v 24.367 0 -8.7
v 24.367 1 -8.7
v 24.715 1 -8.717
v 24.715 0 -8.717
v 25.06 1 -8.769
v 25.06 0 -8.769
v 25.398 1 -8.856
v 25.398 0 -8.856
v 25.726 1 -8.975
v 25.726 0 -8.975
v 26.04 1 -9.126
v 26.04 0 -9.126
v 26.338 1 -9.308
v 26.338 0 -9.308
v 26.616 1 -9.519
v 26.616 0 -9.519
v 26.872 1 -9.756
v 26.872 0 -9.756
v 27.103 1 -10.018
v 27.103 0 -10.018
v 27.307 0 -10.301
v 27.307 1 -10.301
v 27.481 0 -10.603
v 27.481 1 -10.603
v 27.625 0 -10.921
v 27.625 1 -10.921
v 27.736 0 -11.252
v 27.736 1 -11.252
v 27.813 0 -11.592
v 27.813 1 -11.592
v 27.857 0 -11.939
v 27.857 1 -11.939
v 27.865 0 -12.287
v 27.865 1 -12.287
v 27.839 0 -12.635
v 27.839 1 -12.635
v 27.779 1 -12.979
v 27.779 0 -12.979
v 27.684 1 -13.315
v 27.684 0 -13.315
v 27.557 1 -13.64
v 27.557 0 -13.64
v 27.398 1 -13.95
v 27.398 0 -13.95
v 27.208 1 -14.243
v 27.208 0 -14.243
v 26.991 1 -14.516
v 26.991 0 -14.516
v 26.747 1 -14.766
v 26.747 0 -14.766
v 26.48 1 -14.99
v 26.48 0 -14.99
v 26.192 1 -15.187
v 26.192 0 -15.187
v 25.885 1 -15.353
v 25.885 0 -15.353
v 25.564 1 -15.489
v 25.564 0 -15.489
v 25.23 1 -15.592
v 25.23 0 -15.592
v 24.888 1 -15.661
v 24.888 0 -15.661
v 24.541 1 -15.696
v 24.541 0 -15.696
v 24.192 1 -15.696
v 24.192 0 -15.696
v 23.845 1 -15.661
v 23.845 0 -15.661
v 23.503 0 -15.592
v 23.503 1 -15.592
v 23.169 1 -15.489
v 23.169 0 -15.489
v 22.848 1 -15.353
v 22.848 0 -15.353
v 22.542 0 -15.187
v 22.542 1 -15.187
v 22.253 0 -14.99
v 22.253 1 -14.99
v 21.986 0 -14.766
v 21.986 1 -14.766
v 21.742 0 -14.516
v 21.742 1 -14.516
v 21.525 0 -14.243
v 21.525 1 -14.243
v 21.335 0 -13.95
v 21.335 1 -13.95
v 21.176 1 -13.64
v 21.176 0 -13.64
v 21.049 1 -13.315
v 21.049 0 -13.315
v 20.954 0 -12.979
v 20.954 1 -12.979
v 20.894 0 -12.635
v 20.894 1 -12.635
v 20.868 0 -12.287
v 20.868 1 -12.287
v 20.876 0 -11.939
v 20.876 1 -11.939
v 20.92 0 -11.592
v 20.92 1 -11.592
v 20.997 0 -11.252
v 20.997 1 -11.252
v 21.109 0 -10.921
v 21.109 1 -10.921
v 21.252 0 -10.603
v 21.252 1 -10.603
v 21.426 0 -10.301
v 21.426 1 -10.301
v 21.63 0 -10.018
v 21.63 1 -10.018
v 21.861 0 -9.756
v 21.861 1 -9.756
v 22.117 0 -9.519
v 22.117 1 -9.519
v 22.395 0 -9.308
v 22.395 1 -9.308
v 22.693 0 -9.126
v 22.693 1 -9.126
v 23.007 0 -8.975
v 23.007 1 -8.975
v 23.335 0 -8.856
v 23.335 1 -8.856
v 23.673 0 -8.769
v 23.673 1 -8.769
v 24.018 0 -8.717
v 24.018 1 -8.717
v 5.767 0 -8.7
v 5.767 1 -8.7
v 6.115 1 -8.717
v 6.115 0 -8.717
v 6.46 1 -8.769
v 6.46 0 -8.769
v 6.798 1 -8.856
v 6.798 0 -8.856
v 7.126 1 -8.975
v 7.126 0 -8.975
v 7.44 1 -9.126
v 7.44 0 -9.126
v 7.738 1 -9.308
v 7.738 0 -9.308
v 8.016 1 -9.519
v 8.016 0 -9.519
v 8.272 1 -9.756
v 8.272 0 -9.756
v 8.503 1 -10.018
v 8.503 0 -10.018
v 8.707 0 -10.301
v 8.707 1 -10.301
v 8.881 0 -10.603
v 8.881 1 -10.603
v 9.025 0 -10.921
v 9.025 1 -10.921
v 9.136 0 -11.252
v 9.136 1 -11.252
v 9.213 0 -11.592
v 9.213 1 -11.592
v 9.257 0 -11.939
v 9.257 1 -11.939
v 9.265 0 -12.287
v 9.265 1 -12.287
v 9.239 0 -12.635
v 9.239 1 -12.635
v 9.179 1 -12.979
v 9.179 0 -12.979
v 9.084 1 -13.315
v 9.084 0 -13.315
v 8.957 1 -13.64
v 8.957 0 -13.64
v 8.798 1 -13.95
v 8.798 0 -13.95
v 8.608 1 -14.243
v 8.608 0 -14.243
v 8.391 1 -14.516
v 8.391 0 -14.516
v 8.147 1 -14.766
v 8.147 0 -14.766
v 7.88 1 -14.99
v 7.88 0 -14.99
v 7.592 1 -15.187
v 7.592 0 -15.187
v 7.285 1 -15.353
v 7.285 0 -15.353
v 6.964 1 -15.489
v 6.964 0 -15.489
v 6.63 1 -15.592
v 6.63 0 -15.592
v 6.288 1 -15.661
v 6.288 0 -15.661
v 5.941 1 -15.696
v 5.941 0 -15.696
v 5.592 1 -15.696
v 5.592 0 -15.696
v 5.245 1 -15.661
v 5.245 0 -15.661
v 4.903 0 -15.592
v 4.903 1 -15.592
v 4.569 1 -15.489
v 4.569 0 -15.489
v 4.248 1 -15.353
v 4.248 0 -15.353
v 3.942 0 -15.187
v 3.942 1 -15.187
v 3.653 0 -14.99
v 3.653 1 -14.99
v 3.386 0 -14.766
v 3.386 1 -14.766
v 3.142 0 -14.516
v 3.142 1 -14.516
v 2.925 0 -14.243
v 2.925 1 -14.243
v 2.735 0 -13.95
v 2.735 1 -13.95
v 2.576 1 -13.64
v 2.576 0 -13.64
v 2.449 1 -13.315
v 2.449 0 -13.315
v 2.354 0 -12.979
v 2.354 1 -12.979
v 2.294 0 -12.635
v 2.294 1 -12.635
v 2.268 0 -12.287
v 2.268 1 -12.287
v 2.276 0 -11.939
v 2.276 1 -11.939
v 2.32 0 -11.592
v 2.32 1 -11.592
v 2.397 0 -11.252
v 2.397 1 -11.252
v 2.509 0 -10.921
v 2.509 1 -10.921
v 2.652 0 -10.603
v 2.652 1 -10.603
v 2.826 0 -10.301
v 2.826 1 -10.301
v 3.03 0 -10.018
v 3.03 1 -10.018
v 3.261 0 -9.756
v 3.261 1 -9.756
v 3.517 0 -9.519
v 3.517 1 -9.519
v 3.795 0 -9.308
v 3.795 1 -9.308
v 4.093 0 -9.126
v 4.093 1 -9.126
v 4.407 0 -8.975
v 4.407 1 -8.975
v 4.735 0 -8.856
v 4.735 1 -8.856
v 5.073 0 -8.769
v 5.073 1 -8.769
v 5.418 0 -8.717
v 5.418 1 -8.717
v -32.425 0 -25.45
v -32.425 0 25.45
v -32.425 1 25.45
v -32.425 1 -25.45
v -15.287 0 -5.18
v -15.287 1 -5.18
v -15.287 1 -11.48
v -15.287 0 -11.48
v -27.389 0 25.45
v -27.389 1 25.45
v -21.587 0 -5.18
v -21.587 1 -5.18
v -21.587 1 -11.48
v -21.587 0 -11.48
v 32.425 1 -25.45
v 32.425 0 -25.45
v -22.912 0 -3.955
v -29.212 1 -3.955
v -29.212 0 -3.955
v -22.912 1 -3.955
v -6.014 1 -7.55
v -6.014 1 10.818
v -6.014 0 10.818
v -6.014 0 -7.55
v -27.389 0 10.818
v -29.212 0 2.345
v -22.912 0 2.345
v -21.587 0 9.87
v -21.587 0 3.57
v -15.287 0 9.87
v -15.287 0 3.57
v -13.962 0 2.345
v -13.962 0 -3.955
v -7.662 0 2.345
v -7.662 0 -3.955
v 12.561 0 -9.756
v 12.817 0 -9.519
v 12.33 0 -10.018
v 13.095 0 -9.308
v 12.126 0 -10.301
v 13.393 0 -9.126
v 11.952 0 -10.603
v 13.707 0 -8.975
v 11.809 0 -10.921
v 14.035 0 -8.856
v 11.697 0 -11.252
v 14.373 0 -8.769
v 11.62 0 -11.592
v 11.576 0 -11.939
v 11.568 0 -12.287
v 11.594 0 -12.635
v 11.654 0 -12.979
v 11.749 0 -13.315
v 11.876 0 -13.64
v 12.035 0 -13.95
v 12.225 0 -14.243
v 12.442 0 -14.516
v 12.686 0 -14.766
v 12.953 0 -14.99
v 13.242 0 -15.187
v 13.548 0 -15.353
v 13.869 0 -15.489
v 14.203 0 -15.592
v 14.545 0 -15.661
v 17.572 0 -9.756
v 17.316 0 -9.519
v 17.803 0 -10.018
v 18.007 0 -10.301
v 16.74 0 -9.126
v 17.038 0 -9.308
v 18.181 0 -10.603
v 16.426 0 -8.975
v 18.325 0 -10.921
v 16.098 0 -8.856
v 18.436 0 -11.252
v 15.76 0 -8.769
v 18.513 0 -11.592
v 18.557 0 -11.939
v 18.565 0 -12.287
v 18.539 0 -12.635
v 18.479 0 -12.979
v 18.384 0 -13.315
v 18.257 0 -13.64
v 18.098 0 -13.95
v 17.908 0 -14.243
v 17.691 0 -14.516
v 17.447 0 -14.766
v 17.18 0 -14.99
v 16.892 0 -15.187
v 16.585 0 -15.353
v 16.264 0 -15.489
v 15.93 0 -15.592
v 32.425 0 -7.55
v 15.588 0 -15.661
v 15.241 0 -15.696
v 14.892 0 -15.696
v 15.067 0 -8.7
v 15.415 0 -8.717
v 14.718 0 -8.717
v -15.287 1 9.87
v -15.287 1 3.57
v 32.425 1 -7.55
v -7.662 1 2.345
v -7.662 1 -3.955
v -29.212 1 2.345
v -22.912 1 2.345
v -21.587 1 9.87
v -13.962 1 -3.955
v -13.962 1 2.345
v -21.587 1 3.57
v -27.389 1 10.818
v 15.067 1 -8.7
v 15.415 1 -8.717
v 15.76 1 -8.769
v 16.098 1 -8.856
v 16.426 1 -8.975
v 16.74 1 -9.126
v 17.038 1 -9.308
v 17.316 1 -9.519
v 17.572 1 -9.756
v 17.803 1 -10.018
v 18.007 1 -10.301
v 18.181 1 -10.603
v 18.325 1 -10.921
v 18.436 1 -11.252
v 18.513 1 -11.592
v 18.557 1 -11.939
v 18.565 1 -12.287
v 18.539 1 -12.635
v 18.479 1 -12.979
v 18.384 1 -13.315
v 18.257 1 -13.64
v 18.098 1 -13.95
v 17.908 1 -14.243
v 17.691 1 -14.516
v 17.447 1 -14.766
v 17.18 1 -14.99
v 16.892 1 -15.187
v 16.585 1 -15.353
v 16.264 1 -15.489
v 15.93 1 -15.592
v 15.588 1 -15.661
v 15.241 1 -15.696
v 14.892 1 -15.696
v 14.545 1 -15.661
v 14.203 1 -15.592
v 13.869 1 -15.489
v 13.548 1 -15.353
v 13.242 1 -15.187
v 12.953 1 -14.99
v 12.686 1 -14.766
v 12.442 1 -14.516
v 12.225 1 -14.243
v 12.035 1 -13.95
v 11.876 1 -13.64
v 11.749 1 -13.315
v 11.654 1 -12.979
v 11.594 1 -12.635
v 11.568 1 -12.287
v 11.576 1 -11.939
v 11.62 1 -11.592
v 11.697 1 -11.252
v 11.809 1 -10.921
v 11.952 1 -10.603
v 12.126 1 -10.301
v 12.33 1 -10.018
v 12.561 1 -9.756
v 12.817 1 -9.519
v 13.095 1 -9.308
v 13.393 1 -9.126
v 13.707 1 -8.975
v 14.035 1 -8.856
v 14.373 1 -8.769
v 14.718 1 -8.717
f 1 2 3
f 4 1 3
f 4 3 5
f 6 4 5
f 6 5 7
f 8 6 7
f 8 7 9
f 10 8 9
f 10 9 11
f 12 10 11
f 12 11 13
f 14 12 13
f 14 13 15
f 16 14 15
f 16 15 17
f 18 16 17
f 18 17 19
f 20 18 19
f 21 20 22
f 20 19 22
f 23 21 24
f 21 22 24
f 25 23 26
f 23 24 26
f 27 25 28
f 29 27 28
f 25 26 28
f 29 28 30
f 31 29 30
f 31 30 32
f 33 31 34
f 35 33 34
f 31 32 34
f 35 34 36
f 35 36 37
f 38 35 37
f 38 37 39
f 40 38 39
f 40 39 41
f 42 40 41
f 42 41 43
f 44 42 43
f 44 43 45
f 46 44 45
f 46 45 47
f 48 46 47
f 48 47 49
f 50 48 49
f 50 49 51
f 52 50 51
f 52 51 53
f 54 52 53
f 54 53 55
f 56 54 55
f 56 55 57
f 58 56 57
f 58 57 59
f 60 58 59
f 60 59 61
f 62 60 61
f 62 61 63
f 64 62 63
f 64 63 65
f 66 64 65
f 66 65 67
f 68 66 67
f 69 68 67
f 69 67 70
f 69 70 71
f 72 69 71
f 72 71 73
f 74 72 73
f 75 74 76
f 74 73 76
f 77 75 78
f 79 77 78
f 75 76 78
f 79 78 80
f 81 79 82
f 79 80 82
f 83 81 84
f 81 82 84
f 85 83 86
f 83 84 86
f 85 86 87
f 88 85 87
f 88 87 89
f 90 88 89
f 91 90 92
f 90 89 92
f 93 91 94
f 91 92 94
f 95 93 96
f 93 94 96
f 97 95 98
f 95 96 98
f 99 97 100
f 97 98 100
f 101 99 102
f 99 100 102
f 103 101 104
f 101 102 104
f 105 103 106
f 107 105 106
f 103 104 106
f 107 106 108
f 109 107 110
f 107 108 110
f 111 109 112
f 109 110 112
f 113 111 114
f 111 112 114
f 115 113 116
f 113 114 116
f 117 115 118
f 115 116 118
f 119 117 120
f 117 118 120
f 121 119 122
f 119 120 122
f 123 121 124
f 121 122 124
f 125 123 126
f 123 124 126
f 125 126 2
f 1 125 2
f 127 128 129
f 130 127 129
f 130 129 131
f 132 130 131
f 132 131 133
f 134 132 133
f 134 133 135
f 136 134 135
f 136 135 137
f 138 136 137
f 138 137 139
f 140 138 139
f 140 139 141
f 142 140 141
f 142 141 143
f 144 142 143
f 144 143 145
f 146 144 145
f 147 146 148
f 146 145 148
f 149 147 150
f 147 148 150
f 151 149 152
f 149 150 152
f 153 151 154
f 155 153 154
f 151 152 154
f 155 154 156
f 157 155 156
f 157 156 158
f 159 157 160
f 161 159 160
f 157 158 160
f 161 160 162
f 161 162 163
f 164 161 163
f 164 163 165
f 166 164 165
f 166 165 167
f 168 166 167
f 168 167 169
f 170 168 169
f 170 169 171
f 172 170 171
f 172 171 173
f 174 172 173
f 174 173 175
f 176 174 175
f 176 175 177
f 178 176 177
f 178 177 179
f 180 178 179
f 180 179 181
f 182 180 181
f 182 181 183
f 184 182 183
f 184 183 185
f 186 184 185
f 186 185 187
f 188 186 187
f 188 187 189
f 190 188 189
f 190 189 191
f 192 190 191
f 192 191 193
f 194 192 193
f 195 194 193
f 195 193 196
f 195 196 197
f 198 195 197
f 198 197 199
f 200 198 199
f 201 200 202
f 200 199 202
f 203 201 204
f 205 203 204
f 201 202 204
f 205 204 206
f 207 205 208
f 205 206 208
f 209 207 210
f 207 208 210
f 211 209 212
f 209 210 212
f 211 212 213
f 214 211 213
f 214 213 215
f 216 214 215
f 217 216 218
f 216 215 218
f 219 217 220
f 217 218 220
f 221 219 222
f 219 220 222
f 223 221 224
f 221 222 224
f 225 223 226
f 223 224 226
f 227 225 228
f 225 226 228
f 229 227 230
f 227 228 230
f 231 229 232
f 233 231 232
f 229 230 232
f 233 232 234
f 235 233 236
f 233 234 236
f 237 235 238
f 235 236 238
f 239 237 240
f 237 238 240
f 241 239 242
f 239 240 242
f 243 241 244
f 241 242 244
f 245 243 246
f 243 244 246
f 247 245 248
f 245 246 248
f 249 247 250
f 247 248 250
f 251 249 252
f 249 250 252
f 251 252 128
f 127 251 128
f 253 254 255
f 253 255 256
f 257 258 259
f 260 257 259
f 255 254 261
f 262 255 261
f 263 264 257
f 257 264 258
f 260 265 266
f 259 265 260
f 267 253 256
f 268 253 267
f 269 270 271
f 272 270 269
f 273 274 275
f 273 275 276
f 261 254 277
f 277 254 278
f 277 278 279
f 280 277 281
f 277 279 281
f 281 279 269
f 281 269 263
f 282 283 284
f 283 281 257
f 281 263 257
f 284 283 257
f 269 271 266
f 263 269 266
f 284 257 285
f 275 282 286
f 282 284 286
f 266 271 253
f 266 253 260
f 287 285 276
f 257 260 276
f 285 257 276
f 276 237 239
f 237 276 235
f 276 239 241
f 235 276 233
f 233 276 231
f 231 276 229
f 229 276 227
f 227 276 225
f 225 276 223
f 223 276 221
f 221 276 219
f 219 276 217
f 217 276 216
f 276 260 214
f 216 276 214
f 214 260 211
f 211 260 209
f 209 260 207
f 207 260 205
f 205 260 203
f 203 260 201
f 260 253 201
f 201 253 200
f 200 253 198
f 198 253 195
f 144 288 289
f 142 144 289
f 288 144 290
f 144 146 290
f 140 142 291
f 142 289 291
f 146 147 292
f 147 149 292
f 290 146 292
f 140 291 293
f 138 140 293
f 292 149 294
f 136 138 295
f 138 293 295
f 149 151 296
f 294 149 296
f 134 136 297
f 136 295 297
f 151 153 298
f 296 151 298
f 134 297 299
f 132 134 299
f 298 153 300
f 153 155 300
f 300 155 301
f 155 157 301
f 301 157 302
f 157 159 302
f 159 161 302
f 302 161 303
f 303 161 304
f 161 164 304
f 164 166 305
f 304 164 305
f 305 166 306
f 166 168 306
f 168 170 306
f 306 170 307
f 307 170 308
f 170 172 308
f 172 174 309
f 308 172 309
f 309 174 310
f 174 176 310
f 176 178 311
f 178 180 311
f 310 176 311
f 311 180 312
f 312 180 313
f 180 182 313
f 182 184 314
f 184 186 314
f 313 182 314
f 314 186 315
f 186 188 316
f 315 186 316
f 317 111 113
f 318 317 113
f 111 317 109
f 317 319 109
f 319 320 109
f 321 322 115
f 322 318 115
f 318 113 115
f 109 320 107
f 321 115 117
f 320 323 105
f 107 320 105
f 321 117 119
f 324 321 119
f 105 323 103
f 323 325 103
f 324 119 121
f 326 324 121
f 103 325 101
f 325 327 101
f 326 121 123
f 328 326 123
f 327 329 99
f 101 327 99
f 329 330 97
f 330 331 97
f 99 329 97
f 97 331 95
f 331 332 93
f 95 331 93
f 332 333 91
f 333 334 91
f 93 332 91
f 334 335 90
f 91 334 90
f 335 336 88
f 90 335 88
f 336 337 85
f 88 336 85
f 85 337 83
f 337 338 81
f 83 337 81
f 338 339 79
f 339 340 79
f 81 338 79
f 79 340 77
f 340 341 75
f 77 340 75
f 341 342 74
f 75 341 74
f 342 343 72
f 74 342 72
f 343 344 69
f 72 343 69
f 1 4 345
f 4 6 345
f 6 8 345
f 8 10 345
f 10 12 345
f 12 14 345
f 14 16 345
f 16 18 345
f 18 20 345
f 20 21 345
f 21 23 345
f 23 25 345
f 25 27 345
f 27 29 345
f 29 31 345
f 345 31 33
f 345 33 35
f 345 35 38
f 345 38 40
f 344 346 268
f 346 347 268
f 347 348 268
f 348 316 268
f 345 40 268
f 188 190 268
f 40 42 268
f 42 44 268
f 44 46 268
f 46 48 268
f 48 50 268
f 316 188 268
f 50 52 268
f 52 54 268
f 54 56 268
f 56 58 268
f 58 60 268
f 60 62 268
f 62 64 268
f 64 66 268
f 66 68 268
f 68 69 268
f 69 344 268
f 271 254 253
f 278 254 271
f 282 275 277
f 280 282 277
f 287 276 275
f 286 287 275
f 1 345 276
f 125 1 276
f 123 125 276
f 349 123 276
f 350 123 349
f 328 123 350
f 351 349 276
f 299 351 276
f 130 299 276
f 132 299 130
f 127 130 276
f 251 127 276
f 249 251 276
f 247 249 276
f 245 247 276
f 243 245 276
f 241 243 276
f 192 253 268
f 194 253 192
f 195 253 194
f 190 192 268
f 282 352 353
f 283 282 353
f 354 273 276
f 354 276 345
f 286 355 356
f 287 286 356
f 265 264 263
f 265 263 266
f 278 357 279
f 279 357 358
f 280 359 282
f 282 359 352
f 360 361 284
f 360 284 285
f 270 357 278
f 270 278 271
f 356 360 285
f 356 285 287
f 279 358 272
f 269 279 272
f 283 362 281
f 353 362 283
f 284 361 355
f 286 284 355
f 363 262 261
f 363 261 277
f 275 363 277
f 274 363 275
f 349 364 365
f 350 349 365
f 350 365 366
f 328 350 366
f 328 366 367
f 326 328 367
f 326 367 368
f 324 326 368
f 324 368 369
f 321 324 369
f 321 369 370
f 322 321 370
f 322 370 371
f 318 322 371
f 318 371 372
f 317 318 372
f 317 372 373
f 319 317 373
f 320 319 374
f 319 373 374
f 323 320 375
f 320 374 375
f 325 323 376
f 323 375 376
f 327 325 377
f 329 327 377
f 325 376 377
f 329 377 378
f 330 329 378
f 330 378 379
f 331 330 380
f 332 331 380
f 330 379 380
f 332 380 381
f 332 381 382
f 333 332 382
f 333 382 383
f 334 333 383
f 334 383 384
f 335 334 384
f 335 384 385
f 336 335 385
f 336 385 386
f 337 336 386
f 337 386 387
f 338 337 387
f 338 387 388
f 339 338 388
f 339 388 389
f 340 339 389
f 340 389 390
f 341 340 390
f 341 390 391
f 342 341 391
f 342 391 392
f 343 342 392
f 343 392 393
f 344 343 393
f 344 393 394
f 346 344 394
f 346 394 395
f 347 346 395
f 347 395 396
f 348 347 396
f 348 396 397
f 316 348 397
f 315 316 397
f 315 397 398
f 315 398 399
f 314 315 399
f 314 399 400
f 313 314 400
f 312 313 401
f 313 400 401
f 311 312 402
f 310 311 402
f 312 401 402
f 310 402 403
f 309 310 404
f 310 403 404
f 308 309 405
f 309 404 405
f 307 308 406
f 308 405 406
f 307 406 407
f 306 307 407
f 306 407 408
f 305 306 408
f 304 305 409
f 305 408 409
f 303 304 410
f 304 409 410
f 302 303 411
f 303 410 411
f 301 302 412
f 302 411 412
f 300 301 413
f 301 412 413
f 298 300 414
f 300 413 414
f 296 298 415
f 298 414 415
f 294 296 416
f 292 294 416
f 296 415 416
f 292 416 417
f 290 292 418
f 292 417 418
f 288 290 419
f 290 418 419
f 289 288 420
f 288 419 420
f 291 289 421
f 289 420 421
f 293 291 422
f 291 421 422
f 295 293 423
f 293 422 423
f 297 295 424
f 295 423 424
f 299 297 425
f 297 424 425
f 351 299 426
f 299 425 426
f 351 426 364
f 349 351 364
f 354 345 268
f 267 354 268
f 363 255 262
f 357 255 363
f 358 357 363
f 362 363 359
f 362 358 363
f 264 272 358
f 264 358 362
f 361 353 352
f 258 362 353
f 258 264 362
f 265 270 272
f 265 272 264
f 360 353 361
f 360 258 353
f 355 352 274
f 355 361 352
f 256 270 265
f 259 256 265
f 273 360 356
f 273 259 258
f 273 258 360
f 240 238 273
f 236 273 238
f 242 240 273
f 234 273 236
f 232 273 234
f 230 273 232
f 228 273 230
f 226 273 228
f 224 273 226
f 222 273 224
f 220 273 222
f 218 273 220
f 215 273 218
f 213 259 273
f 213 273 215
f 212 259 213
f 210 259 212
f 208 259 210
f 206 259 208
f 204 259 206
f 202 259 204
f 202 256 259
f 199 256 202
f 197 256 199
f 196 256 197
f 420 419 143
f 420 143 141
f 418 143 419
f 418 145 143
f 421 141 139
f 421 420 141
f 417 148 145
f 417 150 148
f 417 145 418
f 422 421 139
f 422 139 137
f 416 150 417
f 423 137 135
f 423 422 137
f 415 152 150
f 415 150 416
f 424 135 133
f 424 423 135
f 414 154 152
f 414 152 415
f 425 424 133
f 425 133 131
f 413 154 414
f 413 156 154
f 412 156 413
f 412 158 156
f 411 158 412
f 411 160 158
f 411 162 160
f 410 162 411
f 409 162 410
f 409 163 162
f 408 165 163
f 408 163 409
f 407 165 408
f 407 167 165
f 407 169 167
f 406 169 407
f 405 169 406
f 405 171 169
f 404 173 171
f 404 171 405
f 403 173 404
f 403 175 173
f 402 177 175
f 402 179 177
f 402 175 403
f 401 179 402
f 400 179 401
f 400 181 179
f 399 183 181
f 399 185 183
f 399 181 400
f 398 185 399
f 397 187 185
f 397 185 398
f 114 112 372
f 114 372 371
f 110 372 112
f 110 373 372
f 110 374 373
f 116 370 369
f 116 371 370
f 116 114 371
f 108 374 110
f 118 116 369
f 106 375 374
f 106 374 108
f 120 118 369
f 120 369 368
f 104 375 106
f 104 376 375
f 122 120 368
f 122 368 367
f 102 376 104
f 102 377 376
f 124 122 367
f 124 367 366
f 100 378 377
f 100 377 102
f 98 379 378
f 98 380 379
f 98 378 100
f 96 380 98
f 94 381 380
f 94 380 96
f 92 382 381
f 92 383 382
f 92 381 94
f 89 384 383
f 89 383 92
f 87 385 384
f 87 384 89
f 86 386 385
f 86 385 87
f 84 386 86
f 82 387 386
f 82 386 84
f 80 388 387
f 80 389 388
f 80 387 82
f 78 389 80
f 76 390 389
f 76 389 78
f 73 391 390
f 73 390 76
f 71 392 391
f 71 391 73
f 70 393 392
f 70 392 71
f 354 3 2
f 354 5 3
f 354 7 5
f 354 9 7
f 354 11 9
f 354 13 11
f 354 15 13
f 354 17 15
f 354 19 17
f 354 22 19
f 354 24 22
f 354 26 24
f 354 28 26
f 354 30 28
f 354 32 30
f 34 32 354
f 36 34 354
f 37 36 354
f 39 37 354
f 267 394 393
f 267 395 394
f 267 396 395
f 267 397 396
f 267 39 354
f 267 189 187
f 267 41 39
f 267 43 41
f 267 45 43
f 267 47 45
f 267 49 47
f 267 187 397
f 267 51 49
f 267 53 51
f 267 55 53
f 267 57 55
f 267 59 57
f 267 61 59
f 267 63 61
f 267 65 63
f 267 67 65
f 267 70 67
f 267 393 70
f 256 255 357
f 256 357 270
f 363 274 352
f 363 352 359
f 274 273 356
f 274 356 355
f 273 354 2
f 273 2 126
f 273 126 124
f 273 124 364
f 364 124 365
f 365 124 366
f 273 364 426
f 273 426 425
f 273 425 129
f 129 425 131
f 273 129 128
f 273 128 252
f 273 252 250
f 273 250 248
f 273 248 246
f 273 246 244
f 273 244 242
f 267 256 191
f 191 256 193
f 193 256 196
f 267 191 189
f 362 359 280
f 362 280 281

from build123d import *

# Parameters (mm, degrees)
SKETCH1_W           = 64.85
SKETCH1_H           = 50.9
BOSS_EXTRUDE1_DEPTH = 1
SKETCH2_W           = 6.3
SKETCH2_H           = 6.3
SKETCH2_R           = 2.25
CUT_EXTRUDE1_DEPTH  = 10
SKETCH3_R           = 3.5
CUT_EXTRUDE2_DEPTH  = 10
CUT_EXTRUDE3_DEPTH  = 10


with BuildPart() as part:
    # Sketch1 → Boss-Extrude1 (new body)
    with BuildSketch(Plane(origin=(0, 0, 0), x_dir=(1, 0, 0), z_dir=(0, 1, 0))):
        Rectangle(SKETCH1_W, SKETCH1_H)
    extrude(amount=BOSS_EXTRUDE1_DEPTH)

    # Sketch2 → Cut-Extrude1 (cut)
    # profile 1 of 4: a face of its own
    with BuildSketch(Plane(origin=(0, 1, 0), x_dir=(1, 0, 0), z_dir=(0, 1, 0))):
        with Locations((-26.061755396, 0.805169379)):
            Rectangle(SKETCH2_W, SKETCH2_H)
        with Locations((-26.061755396, 0.805169379)):
            Circle(SKETCH2_R, mode=Mode.SUBTRACT)
    # profile 2 of 4: a face of its own
    with BuildSketch(Plane(origin=(0, 1, 0), x_dir=(1, 0, 0), z_dir=(0, 1, 0))):
        with Locations((-10.811755396, 0.805169379)):
            Rectangle(SKETCH2_W, SKETCH2_H)
        with Locations((-10.811755396, 0.805169379)):
            Circle(SKETCH2_R, mode=Mode.SUBTRACT)
    # profile 3 of 4: a face of its own
    with BuildSketch(Plane(origin=(0, 1, 0), x_dir=(1, 0, 0), z_dir=(0, 1, 0))):
        with Locations((-18.436755396, 8.330169379)):
            Rectangle(SKETCH2_W, SKETCH2_H)
        with Locations((-18.436755396, 8.330169379)):
            Circle(SKETCH2_R, mode=Mode.SUBTRACT)
    # profile 4 of 4: a face of its own
    with BuildSketch(Plane(origin=(0, 1, 0), x_dir=(1, 0, 0), z_dir=(0, 1, 0))):
        with Locations((-18.436755396, -6.719830621)):
            Rectangle(SKETCH2_W, SKETCH2_H)
        with Locations((-18.436755396, -6.719830621)):
            Circle(SKETCH2_R, mode=Mode.SUBTRACT)
    extrude(amount=-CUT_EXTRUDE1_DEPTH, mode=Mode.SUBTRACT)


with BuildPart() as cut_extrude1_kept_piece:
    # of the separate pieces the step leaves, the one the design keeps (cut_extrude1_pieces_kept)
    add(part.part.solids().sort_by_distance((32.425, 0, 25.45))[0])

    # Sketch3 → Cut-Extrude2 (cut)
    with BuildSketch(Plane(origin=(0, 1, 0), x_dir=(1, 0, 0), z_dir=(0, 1, 0))):
        with Locations(Location((5.766564163, 12.20008786, 0), (0, 0, 270))):
            Circle(SKETCH3_R)
        with Locations(Location((15.066564163, 12.20008786, 0), (0, 0, 270))):
            Circle(SKETCH3_R)
        with Locations(Location((24.366564163, 12.20008786, 0), (0, 0, 270))):
            Circle(SKETCH3_R)
    extrude(amount=-CUT_EXTRUDE2_DEPTH, mode=Mode.SUBTRACT)

    # Sketch6 → Cut-Extrude3 (cut)
    with BuildSketch(Plane(origin=(0, 1, 0), x_dir=(1, 0, 0), z_dir=(0, 1, 0))):
        Polygon((-6.013732281, -10.818181441), (-6.013732281, 7.549848679), (32.425, 7.549848679), (32.425, -25.45), (-27.388628542, -25.45), (-27.388628542, -10.818181441), align=None)
    extrude(amount=-CUT_EXTRUDE3_DEPTH, mode=Mode.SUBTRACT)


solid = cut_extrude1_kept_piece.part
